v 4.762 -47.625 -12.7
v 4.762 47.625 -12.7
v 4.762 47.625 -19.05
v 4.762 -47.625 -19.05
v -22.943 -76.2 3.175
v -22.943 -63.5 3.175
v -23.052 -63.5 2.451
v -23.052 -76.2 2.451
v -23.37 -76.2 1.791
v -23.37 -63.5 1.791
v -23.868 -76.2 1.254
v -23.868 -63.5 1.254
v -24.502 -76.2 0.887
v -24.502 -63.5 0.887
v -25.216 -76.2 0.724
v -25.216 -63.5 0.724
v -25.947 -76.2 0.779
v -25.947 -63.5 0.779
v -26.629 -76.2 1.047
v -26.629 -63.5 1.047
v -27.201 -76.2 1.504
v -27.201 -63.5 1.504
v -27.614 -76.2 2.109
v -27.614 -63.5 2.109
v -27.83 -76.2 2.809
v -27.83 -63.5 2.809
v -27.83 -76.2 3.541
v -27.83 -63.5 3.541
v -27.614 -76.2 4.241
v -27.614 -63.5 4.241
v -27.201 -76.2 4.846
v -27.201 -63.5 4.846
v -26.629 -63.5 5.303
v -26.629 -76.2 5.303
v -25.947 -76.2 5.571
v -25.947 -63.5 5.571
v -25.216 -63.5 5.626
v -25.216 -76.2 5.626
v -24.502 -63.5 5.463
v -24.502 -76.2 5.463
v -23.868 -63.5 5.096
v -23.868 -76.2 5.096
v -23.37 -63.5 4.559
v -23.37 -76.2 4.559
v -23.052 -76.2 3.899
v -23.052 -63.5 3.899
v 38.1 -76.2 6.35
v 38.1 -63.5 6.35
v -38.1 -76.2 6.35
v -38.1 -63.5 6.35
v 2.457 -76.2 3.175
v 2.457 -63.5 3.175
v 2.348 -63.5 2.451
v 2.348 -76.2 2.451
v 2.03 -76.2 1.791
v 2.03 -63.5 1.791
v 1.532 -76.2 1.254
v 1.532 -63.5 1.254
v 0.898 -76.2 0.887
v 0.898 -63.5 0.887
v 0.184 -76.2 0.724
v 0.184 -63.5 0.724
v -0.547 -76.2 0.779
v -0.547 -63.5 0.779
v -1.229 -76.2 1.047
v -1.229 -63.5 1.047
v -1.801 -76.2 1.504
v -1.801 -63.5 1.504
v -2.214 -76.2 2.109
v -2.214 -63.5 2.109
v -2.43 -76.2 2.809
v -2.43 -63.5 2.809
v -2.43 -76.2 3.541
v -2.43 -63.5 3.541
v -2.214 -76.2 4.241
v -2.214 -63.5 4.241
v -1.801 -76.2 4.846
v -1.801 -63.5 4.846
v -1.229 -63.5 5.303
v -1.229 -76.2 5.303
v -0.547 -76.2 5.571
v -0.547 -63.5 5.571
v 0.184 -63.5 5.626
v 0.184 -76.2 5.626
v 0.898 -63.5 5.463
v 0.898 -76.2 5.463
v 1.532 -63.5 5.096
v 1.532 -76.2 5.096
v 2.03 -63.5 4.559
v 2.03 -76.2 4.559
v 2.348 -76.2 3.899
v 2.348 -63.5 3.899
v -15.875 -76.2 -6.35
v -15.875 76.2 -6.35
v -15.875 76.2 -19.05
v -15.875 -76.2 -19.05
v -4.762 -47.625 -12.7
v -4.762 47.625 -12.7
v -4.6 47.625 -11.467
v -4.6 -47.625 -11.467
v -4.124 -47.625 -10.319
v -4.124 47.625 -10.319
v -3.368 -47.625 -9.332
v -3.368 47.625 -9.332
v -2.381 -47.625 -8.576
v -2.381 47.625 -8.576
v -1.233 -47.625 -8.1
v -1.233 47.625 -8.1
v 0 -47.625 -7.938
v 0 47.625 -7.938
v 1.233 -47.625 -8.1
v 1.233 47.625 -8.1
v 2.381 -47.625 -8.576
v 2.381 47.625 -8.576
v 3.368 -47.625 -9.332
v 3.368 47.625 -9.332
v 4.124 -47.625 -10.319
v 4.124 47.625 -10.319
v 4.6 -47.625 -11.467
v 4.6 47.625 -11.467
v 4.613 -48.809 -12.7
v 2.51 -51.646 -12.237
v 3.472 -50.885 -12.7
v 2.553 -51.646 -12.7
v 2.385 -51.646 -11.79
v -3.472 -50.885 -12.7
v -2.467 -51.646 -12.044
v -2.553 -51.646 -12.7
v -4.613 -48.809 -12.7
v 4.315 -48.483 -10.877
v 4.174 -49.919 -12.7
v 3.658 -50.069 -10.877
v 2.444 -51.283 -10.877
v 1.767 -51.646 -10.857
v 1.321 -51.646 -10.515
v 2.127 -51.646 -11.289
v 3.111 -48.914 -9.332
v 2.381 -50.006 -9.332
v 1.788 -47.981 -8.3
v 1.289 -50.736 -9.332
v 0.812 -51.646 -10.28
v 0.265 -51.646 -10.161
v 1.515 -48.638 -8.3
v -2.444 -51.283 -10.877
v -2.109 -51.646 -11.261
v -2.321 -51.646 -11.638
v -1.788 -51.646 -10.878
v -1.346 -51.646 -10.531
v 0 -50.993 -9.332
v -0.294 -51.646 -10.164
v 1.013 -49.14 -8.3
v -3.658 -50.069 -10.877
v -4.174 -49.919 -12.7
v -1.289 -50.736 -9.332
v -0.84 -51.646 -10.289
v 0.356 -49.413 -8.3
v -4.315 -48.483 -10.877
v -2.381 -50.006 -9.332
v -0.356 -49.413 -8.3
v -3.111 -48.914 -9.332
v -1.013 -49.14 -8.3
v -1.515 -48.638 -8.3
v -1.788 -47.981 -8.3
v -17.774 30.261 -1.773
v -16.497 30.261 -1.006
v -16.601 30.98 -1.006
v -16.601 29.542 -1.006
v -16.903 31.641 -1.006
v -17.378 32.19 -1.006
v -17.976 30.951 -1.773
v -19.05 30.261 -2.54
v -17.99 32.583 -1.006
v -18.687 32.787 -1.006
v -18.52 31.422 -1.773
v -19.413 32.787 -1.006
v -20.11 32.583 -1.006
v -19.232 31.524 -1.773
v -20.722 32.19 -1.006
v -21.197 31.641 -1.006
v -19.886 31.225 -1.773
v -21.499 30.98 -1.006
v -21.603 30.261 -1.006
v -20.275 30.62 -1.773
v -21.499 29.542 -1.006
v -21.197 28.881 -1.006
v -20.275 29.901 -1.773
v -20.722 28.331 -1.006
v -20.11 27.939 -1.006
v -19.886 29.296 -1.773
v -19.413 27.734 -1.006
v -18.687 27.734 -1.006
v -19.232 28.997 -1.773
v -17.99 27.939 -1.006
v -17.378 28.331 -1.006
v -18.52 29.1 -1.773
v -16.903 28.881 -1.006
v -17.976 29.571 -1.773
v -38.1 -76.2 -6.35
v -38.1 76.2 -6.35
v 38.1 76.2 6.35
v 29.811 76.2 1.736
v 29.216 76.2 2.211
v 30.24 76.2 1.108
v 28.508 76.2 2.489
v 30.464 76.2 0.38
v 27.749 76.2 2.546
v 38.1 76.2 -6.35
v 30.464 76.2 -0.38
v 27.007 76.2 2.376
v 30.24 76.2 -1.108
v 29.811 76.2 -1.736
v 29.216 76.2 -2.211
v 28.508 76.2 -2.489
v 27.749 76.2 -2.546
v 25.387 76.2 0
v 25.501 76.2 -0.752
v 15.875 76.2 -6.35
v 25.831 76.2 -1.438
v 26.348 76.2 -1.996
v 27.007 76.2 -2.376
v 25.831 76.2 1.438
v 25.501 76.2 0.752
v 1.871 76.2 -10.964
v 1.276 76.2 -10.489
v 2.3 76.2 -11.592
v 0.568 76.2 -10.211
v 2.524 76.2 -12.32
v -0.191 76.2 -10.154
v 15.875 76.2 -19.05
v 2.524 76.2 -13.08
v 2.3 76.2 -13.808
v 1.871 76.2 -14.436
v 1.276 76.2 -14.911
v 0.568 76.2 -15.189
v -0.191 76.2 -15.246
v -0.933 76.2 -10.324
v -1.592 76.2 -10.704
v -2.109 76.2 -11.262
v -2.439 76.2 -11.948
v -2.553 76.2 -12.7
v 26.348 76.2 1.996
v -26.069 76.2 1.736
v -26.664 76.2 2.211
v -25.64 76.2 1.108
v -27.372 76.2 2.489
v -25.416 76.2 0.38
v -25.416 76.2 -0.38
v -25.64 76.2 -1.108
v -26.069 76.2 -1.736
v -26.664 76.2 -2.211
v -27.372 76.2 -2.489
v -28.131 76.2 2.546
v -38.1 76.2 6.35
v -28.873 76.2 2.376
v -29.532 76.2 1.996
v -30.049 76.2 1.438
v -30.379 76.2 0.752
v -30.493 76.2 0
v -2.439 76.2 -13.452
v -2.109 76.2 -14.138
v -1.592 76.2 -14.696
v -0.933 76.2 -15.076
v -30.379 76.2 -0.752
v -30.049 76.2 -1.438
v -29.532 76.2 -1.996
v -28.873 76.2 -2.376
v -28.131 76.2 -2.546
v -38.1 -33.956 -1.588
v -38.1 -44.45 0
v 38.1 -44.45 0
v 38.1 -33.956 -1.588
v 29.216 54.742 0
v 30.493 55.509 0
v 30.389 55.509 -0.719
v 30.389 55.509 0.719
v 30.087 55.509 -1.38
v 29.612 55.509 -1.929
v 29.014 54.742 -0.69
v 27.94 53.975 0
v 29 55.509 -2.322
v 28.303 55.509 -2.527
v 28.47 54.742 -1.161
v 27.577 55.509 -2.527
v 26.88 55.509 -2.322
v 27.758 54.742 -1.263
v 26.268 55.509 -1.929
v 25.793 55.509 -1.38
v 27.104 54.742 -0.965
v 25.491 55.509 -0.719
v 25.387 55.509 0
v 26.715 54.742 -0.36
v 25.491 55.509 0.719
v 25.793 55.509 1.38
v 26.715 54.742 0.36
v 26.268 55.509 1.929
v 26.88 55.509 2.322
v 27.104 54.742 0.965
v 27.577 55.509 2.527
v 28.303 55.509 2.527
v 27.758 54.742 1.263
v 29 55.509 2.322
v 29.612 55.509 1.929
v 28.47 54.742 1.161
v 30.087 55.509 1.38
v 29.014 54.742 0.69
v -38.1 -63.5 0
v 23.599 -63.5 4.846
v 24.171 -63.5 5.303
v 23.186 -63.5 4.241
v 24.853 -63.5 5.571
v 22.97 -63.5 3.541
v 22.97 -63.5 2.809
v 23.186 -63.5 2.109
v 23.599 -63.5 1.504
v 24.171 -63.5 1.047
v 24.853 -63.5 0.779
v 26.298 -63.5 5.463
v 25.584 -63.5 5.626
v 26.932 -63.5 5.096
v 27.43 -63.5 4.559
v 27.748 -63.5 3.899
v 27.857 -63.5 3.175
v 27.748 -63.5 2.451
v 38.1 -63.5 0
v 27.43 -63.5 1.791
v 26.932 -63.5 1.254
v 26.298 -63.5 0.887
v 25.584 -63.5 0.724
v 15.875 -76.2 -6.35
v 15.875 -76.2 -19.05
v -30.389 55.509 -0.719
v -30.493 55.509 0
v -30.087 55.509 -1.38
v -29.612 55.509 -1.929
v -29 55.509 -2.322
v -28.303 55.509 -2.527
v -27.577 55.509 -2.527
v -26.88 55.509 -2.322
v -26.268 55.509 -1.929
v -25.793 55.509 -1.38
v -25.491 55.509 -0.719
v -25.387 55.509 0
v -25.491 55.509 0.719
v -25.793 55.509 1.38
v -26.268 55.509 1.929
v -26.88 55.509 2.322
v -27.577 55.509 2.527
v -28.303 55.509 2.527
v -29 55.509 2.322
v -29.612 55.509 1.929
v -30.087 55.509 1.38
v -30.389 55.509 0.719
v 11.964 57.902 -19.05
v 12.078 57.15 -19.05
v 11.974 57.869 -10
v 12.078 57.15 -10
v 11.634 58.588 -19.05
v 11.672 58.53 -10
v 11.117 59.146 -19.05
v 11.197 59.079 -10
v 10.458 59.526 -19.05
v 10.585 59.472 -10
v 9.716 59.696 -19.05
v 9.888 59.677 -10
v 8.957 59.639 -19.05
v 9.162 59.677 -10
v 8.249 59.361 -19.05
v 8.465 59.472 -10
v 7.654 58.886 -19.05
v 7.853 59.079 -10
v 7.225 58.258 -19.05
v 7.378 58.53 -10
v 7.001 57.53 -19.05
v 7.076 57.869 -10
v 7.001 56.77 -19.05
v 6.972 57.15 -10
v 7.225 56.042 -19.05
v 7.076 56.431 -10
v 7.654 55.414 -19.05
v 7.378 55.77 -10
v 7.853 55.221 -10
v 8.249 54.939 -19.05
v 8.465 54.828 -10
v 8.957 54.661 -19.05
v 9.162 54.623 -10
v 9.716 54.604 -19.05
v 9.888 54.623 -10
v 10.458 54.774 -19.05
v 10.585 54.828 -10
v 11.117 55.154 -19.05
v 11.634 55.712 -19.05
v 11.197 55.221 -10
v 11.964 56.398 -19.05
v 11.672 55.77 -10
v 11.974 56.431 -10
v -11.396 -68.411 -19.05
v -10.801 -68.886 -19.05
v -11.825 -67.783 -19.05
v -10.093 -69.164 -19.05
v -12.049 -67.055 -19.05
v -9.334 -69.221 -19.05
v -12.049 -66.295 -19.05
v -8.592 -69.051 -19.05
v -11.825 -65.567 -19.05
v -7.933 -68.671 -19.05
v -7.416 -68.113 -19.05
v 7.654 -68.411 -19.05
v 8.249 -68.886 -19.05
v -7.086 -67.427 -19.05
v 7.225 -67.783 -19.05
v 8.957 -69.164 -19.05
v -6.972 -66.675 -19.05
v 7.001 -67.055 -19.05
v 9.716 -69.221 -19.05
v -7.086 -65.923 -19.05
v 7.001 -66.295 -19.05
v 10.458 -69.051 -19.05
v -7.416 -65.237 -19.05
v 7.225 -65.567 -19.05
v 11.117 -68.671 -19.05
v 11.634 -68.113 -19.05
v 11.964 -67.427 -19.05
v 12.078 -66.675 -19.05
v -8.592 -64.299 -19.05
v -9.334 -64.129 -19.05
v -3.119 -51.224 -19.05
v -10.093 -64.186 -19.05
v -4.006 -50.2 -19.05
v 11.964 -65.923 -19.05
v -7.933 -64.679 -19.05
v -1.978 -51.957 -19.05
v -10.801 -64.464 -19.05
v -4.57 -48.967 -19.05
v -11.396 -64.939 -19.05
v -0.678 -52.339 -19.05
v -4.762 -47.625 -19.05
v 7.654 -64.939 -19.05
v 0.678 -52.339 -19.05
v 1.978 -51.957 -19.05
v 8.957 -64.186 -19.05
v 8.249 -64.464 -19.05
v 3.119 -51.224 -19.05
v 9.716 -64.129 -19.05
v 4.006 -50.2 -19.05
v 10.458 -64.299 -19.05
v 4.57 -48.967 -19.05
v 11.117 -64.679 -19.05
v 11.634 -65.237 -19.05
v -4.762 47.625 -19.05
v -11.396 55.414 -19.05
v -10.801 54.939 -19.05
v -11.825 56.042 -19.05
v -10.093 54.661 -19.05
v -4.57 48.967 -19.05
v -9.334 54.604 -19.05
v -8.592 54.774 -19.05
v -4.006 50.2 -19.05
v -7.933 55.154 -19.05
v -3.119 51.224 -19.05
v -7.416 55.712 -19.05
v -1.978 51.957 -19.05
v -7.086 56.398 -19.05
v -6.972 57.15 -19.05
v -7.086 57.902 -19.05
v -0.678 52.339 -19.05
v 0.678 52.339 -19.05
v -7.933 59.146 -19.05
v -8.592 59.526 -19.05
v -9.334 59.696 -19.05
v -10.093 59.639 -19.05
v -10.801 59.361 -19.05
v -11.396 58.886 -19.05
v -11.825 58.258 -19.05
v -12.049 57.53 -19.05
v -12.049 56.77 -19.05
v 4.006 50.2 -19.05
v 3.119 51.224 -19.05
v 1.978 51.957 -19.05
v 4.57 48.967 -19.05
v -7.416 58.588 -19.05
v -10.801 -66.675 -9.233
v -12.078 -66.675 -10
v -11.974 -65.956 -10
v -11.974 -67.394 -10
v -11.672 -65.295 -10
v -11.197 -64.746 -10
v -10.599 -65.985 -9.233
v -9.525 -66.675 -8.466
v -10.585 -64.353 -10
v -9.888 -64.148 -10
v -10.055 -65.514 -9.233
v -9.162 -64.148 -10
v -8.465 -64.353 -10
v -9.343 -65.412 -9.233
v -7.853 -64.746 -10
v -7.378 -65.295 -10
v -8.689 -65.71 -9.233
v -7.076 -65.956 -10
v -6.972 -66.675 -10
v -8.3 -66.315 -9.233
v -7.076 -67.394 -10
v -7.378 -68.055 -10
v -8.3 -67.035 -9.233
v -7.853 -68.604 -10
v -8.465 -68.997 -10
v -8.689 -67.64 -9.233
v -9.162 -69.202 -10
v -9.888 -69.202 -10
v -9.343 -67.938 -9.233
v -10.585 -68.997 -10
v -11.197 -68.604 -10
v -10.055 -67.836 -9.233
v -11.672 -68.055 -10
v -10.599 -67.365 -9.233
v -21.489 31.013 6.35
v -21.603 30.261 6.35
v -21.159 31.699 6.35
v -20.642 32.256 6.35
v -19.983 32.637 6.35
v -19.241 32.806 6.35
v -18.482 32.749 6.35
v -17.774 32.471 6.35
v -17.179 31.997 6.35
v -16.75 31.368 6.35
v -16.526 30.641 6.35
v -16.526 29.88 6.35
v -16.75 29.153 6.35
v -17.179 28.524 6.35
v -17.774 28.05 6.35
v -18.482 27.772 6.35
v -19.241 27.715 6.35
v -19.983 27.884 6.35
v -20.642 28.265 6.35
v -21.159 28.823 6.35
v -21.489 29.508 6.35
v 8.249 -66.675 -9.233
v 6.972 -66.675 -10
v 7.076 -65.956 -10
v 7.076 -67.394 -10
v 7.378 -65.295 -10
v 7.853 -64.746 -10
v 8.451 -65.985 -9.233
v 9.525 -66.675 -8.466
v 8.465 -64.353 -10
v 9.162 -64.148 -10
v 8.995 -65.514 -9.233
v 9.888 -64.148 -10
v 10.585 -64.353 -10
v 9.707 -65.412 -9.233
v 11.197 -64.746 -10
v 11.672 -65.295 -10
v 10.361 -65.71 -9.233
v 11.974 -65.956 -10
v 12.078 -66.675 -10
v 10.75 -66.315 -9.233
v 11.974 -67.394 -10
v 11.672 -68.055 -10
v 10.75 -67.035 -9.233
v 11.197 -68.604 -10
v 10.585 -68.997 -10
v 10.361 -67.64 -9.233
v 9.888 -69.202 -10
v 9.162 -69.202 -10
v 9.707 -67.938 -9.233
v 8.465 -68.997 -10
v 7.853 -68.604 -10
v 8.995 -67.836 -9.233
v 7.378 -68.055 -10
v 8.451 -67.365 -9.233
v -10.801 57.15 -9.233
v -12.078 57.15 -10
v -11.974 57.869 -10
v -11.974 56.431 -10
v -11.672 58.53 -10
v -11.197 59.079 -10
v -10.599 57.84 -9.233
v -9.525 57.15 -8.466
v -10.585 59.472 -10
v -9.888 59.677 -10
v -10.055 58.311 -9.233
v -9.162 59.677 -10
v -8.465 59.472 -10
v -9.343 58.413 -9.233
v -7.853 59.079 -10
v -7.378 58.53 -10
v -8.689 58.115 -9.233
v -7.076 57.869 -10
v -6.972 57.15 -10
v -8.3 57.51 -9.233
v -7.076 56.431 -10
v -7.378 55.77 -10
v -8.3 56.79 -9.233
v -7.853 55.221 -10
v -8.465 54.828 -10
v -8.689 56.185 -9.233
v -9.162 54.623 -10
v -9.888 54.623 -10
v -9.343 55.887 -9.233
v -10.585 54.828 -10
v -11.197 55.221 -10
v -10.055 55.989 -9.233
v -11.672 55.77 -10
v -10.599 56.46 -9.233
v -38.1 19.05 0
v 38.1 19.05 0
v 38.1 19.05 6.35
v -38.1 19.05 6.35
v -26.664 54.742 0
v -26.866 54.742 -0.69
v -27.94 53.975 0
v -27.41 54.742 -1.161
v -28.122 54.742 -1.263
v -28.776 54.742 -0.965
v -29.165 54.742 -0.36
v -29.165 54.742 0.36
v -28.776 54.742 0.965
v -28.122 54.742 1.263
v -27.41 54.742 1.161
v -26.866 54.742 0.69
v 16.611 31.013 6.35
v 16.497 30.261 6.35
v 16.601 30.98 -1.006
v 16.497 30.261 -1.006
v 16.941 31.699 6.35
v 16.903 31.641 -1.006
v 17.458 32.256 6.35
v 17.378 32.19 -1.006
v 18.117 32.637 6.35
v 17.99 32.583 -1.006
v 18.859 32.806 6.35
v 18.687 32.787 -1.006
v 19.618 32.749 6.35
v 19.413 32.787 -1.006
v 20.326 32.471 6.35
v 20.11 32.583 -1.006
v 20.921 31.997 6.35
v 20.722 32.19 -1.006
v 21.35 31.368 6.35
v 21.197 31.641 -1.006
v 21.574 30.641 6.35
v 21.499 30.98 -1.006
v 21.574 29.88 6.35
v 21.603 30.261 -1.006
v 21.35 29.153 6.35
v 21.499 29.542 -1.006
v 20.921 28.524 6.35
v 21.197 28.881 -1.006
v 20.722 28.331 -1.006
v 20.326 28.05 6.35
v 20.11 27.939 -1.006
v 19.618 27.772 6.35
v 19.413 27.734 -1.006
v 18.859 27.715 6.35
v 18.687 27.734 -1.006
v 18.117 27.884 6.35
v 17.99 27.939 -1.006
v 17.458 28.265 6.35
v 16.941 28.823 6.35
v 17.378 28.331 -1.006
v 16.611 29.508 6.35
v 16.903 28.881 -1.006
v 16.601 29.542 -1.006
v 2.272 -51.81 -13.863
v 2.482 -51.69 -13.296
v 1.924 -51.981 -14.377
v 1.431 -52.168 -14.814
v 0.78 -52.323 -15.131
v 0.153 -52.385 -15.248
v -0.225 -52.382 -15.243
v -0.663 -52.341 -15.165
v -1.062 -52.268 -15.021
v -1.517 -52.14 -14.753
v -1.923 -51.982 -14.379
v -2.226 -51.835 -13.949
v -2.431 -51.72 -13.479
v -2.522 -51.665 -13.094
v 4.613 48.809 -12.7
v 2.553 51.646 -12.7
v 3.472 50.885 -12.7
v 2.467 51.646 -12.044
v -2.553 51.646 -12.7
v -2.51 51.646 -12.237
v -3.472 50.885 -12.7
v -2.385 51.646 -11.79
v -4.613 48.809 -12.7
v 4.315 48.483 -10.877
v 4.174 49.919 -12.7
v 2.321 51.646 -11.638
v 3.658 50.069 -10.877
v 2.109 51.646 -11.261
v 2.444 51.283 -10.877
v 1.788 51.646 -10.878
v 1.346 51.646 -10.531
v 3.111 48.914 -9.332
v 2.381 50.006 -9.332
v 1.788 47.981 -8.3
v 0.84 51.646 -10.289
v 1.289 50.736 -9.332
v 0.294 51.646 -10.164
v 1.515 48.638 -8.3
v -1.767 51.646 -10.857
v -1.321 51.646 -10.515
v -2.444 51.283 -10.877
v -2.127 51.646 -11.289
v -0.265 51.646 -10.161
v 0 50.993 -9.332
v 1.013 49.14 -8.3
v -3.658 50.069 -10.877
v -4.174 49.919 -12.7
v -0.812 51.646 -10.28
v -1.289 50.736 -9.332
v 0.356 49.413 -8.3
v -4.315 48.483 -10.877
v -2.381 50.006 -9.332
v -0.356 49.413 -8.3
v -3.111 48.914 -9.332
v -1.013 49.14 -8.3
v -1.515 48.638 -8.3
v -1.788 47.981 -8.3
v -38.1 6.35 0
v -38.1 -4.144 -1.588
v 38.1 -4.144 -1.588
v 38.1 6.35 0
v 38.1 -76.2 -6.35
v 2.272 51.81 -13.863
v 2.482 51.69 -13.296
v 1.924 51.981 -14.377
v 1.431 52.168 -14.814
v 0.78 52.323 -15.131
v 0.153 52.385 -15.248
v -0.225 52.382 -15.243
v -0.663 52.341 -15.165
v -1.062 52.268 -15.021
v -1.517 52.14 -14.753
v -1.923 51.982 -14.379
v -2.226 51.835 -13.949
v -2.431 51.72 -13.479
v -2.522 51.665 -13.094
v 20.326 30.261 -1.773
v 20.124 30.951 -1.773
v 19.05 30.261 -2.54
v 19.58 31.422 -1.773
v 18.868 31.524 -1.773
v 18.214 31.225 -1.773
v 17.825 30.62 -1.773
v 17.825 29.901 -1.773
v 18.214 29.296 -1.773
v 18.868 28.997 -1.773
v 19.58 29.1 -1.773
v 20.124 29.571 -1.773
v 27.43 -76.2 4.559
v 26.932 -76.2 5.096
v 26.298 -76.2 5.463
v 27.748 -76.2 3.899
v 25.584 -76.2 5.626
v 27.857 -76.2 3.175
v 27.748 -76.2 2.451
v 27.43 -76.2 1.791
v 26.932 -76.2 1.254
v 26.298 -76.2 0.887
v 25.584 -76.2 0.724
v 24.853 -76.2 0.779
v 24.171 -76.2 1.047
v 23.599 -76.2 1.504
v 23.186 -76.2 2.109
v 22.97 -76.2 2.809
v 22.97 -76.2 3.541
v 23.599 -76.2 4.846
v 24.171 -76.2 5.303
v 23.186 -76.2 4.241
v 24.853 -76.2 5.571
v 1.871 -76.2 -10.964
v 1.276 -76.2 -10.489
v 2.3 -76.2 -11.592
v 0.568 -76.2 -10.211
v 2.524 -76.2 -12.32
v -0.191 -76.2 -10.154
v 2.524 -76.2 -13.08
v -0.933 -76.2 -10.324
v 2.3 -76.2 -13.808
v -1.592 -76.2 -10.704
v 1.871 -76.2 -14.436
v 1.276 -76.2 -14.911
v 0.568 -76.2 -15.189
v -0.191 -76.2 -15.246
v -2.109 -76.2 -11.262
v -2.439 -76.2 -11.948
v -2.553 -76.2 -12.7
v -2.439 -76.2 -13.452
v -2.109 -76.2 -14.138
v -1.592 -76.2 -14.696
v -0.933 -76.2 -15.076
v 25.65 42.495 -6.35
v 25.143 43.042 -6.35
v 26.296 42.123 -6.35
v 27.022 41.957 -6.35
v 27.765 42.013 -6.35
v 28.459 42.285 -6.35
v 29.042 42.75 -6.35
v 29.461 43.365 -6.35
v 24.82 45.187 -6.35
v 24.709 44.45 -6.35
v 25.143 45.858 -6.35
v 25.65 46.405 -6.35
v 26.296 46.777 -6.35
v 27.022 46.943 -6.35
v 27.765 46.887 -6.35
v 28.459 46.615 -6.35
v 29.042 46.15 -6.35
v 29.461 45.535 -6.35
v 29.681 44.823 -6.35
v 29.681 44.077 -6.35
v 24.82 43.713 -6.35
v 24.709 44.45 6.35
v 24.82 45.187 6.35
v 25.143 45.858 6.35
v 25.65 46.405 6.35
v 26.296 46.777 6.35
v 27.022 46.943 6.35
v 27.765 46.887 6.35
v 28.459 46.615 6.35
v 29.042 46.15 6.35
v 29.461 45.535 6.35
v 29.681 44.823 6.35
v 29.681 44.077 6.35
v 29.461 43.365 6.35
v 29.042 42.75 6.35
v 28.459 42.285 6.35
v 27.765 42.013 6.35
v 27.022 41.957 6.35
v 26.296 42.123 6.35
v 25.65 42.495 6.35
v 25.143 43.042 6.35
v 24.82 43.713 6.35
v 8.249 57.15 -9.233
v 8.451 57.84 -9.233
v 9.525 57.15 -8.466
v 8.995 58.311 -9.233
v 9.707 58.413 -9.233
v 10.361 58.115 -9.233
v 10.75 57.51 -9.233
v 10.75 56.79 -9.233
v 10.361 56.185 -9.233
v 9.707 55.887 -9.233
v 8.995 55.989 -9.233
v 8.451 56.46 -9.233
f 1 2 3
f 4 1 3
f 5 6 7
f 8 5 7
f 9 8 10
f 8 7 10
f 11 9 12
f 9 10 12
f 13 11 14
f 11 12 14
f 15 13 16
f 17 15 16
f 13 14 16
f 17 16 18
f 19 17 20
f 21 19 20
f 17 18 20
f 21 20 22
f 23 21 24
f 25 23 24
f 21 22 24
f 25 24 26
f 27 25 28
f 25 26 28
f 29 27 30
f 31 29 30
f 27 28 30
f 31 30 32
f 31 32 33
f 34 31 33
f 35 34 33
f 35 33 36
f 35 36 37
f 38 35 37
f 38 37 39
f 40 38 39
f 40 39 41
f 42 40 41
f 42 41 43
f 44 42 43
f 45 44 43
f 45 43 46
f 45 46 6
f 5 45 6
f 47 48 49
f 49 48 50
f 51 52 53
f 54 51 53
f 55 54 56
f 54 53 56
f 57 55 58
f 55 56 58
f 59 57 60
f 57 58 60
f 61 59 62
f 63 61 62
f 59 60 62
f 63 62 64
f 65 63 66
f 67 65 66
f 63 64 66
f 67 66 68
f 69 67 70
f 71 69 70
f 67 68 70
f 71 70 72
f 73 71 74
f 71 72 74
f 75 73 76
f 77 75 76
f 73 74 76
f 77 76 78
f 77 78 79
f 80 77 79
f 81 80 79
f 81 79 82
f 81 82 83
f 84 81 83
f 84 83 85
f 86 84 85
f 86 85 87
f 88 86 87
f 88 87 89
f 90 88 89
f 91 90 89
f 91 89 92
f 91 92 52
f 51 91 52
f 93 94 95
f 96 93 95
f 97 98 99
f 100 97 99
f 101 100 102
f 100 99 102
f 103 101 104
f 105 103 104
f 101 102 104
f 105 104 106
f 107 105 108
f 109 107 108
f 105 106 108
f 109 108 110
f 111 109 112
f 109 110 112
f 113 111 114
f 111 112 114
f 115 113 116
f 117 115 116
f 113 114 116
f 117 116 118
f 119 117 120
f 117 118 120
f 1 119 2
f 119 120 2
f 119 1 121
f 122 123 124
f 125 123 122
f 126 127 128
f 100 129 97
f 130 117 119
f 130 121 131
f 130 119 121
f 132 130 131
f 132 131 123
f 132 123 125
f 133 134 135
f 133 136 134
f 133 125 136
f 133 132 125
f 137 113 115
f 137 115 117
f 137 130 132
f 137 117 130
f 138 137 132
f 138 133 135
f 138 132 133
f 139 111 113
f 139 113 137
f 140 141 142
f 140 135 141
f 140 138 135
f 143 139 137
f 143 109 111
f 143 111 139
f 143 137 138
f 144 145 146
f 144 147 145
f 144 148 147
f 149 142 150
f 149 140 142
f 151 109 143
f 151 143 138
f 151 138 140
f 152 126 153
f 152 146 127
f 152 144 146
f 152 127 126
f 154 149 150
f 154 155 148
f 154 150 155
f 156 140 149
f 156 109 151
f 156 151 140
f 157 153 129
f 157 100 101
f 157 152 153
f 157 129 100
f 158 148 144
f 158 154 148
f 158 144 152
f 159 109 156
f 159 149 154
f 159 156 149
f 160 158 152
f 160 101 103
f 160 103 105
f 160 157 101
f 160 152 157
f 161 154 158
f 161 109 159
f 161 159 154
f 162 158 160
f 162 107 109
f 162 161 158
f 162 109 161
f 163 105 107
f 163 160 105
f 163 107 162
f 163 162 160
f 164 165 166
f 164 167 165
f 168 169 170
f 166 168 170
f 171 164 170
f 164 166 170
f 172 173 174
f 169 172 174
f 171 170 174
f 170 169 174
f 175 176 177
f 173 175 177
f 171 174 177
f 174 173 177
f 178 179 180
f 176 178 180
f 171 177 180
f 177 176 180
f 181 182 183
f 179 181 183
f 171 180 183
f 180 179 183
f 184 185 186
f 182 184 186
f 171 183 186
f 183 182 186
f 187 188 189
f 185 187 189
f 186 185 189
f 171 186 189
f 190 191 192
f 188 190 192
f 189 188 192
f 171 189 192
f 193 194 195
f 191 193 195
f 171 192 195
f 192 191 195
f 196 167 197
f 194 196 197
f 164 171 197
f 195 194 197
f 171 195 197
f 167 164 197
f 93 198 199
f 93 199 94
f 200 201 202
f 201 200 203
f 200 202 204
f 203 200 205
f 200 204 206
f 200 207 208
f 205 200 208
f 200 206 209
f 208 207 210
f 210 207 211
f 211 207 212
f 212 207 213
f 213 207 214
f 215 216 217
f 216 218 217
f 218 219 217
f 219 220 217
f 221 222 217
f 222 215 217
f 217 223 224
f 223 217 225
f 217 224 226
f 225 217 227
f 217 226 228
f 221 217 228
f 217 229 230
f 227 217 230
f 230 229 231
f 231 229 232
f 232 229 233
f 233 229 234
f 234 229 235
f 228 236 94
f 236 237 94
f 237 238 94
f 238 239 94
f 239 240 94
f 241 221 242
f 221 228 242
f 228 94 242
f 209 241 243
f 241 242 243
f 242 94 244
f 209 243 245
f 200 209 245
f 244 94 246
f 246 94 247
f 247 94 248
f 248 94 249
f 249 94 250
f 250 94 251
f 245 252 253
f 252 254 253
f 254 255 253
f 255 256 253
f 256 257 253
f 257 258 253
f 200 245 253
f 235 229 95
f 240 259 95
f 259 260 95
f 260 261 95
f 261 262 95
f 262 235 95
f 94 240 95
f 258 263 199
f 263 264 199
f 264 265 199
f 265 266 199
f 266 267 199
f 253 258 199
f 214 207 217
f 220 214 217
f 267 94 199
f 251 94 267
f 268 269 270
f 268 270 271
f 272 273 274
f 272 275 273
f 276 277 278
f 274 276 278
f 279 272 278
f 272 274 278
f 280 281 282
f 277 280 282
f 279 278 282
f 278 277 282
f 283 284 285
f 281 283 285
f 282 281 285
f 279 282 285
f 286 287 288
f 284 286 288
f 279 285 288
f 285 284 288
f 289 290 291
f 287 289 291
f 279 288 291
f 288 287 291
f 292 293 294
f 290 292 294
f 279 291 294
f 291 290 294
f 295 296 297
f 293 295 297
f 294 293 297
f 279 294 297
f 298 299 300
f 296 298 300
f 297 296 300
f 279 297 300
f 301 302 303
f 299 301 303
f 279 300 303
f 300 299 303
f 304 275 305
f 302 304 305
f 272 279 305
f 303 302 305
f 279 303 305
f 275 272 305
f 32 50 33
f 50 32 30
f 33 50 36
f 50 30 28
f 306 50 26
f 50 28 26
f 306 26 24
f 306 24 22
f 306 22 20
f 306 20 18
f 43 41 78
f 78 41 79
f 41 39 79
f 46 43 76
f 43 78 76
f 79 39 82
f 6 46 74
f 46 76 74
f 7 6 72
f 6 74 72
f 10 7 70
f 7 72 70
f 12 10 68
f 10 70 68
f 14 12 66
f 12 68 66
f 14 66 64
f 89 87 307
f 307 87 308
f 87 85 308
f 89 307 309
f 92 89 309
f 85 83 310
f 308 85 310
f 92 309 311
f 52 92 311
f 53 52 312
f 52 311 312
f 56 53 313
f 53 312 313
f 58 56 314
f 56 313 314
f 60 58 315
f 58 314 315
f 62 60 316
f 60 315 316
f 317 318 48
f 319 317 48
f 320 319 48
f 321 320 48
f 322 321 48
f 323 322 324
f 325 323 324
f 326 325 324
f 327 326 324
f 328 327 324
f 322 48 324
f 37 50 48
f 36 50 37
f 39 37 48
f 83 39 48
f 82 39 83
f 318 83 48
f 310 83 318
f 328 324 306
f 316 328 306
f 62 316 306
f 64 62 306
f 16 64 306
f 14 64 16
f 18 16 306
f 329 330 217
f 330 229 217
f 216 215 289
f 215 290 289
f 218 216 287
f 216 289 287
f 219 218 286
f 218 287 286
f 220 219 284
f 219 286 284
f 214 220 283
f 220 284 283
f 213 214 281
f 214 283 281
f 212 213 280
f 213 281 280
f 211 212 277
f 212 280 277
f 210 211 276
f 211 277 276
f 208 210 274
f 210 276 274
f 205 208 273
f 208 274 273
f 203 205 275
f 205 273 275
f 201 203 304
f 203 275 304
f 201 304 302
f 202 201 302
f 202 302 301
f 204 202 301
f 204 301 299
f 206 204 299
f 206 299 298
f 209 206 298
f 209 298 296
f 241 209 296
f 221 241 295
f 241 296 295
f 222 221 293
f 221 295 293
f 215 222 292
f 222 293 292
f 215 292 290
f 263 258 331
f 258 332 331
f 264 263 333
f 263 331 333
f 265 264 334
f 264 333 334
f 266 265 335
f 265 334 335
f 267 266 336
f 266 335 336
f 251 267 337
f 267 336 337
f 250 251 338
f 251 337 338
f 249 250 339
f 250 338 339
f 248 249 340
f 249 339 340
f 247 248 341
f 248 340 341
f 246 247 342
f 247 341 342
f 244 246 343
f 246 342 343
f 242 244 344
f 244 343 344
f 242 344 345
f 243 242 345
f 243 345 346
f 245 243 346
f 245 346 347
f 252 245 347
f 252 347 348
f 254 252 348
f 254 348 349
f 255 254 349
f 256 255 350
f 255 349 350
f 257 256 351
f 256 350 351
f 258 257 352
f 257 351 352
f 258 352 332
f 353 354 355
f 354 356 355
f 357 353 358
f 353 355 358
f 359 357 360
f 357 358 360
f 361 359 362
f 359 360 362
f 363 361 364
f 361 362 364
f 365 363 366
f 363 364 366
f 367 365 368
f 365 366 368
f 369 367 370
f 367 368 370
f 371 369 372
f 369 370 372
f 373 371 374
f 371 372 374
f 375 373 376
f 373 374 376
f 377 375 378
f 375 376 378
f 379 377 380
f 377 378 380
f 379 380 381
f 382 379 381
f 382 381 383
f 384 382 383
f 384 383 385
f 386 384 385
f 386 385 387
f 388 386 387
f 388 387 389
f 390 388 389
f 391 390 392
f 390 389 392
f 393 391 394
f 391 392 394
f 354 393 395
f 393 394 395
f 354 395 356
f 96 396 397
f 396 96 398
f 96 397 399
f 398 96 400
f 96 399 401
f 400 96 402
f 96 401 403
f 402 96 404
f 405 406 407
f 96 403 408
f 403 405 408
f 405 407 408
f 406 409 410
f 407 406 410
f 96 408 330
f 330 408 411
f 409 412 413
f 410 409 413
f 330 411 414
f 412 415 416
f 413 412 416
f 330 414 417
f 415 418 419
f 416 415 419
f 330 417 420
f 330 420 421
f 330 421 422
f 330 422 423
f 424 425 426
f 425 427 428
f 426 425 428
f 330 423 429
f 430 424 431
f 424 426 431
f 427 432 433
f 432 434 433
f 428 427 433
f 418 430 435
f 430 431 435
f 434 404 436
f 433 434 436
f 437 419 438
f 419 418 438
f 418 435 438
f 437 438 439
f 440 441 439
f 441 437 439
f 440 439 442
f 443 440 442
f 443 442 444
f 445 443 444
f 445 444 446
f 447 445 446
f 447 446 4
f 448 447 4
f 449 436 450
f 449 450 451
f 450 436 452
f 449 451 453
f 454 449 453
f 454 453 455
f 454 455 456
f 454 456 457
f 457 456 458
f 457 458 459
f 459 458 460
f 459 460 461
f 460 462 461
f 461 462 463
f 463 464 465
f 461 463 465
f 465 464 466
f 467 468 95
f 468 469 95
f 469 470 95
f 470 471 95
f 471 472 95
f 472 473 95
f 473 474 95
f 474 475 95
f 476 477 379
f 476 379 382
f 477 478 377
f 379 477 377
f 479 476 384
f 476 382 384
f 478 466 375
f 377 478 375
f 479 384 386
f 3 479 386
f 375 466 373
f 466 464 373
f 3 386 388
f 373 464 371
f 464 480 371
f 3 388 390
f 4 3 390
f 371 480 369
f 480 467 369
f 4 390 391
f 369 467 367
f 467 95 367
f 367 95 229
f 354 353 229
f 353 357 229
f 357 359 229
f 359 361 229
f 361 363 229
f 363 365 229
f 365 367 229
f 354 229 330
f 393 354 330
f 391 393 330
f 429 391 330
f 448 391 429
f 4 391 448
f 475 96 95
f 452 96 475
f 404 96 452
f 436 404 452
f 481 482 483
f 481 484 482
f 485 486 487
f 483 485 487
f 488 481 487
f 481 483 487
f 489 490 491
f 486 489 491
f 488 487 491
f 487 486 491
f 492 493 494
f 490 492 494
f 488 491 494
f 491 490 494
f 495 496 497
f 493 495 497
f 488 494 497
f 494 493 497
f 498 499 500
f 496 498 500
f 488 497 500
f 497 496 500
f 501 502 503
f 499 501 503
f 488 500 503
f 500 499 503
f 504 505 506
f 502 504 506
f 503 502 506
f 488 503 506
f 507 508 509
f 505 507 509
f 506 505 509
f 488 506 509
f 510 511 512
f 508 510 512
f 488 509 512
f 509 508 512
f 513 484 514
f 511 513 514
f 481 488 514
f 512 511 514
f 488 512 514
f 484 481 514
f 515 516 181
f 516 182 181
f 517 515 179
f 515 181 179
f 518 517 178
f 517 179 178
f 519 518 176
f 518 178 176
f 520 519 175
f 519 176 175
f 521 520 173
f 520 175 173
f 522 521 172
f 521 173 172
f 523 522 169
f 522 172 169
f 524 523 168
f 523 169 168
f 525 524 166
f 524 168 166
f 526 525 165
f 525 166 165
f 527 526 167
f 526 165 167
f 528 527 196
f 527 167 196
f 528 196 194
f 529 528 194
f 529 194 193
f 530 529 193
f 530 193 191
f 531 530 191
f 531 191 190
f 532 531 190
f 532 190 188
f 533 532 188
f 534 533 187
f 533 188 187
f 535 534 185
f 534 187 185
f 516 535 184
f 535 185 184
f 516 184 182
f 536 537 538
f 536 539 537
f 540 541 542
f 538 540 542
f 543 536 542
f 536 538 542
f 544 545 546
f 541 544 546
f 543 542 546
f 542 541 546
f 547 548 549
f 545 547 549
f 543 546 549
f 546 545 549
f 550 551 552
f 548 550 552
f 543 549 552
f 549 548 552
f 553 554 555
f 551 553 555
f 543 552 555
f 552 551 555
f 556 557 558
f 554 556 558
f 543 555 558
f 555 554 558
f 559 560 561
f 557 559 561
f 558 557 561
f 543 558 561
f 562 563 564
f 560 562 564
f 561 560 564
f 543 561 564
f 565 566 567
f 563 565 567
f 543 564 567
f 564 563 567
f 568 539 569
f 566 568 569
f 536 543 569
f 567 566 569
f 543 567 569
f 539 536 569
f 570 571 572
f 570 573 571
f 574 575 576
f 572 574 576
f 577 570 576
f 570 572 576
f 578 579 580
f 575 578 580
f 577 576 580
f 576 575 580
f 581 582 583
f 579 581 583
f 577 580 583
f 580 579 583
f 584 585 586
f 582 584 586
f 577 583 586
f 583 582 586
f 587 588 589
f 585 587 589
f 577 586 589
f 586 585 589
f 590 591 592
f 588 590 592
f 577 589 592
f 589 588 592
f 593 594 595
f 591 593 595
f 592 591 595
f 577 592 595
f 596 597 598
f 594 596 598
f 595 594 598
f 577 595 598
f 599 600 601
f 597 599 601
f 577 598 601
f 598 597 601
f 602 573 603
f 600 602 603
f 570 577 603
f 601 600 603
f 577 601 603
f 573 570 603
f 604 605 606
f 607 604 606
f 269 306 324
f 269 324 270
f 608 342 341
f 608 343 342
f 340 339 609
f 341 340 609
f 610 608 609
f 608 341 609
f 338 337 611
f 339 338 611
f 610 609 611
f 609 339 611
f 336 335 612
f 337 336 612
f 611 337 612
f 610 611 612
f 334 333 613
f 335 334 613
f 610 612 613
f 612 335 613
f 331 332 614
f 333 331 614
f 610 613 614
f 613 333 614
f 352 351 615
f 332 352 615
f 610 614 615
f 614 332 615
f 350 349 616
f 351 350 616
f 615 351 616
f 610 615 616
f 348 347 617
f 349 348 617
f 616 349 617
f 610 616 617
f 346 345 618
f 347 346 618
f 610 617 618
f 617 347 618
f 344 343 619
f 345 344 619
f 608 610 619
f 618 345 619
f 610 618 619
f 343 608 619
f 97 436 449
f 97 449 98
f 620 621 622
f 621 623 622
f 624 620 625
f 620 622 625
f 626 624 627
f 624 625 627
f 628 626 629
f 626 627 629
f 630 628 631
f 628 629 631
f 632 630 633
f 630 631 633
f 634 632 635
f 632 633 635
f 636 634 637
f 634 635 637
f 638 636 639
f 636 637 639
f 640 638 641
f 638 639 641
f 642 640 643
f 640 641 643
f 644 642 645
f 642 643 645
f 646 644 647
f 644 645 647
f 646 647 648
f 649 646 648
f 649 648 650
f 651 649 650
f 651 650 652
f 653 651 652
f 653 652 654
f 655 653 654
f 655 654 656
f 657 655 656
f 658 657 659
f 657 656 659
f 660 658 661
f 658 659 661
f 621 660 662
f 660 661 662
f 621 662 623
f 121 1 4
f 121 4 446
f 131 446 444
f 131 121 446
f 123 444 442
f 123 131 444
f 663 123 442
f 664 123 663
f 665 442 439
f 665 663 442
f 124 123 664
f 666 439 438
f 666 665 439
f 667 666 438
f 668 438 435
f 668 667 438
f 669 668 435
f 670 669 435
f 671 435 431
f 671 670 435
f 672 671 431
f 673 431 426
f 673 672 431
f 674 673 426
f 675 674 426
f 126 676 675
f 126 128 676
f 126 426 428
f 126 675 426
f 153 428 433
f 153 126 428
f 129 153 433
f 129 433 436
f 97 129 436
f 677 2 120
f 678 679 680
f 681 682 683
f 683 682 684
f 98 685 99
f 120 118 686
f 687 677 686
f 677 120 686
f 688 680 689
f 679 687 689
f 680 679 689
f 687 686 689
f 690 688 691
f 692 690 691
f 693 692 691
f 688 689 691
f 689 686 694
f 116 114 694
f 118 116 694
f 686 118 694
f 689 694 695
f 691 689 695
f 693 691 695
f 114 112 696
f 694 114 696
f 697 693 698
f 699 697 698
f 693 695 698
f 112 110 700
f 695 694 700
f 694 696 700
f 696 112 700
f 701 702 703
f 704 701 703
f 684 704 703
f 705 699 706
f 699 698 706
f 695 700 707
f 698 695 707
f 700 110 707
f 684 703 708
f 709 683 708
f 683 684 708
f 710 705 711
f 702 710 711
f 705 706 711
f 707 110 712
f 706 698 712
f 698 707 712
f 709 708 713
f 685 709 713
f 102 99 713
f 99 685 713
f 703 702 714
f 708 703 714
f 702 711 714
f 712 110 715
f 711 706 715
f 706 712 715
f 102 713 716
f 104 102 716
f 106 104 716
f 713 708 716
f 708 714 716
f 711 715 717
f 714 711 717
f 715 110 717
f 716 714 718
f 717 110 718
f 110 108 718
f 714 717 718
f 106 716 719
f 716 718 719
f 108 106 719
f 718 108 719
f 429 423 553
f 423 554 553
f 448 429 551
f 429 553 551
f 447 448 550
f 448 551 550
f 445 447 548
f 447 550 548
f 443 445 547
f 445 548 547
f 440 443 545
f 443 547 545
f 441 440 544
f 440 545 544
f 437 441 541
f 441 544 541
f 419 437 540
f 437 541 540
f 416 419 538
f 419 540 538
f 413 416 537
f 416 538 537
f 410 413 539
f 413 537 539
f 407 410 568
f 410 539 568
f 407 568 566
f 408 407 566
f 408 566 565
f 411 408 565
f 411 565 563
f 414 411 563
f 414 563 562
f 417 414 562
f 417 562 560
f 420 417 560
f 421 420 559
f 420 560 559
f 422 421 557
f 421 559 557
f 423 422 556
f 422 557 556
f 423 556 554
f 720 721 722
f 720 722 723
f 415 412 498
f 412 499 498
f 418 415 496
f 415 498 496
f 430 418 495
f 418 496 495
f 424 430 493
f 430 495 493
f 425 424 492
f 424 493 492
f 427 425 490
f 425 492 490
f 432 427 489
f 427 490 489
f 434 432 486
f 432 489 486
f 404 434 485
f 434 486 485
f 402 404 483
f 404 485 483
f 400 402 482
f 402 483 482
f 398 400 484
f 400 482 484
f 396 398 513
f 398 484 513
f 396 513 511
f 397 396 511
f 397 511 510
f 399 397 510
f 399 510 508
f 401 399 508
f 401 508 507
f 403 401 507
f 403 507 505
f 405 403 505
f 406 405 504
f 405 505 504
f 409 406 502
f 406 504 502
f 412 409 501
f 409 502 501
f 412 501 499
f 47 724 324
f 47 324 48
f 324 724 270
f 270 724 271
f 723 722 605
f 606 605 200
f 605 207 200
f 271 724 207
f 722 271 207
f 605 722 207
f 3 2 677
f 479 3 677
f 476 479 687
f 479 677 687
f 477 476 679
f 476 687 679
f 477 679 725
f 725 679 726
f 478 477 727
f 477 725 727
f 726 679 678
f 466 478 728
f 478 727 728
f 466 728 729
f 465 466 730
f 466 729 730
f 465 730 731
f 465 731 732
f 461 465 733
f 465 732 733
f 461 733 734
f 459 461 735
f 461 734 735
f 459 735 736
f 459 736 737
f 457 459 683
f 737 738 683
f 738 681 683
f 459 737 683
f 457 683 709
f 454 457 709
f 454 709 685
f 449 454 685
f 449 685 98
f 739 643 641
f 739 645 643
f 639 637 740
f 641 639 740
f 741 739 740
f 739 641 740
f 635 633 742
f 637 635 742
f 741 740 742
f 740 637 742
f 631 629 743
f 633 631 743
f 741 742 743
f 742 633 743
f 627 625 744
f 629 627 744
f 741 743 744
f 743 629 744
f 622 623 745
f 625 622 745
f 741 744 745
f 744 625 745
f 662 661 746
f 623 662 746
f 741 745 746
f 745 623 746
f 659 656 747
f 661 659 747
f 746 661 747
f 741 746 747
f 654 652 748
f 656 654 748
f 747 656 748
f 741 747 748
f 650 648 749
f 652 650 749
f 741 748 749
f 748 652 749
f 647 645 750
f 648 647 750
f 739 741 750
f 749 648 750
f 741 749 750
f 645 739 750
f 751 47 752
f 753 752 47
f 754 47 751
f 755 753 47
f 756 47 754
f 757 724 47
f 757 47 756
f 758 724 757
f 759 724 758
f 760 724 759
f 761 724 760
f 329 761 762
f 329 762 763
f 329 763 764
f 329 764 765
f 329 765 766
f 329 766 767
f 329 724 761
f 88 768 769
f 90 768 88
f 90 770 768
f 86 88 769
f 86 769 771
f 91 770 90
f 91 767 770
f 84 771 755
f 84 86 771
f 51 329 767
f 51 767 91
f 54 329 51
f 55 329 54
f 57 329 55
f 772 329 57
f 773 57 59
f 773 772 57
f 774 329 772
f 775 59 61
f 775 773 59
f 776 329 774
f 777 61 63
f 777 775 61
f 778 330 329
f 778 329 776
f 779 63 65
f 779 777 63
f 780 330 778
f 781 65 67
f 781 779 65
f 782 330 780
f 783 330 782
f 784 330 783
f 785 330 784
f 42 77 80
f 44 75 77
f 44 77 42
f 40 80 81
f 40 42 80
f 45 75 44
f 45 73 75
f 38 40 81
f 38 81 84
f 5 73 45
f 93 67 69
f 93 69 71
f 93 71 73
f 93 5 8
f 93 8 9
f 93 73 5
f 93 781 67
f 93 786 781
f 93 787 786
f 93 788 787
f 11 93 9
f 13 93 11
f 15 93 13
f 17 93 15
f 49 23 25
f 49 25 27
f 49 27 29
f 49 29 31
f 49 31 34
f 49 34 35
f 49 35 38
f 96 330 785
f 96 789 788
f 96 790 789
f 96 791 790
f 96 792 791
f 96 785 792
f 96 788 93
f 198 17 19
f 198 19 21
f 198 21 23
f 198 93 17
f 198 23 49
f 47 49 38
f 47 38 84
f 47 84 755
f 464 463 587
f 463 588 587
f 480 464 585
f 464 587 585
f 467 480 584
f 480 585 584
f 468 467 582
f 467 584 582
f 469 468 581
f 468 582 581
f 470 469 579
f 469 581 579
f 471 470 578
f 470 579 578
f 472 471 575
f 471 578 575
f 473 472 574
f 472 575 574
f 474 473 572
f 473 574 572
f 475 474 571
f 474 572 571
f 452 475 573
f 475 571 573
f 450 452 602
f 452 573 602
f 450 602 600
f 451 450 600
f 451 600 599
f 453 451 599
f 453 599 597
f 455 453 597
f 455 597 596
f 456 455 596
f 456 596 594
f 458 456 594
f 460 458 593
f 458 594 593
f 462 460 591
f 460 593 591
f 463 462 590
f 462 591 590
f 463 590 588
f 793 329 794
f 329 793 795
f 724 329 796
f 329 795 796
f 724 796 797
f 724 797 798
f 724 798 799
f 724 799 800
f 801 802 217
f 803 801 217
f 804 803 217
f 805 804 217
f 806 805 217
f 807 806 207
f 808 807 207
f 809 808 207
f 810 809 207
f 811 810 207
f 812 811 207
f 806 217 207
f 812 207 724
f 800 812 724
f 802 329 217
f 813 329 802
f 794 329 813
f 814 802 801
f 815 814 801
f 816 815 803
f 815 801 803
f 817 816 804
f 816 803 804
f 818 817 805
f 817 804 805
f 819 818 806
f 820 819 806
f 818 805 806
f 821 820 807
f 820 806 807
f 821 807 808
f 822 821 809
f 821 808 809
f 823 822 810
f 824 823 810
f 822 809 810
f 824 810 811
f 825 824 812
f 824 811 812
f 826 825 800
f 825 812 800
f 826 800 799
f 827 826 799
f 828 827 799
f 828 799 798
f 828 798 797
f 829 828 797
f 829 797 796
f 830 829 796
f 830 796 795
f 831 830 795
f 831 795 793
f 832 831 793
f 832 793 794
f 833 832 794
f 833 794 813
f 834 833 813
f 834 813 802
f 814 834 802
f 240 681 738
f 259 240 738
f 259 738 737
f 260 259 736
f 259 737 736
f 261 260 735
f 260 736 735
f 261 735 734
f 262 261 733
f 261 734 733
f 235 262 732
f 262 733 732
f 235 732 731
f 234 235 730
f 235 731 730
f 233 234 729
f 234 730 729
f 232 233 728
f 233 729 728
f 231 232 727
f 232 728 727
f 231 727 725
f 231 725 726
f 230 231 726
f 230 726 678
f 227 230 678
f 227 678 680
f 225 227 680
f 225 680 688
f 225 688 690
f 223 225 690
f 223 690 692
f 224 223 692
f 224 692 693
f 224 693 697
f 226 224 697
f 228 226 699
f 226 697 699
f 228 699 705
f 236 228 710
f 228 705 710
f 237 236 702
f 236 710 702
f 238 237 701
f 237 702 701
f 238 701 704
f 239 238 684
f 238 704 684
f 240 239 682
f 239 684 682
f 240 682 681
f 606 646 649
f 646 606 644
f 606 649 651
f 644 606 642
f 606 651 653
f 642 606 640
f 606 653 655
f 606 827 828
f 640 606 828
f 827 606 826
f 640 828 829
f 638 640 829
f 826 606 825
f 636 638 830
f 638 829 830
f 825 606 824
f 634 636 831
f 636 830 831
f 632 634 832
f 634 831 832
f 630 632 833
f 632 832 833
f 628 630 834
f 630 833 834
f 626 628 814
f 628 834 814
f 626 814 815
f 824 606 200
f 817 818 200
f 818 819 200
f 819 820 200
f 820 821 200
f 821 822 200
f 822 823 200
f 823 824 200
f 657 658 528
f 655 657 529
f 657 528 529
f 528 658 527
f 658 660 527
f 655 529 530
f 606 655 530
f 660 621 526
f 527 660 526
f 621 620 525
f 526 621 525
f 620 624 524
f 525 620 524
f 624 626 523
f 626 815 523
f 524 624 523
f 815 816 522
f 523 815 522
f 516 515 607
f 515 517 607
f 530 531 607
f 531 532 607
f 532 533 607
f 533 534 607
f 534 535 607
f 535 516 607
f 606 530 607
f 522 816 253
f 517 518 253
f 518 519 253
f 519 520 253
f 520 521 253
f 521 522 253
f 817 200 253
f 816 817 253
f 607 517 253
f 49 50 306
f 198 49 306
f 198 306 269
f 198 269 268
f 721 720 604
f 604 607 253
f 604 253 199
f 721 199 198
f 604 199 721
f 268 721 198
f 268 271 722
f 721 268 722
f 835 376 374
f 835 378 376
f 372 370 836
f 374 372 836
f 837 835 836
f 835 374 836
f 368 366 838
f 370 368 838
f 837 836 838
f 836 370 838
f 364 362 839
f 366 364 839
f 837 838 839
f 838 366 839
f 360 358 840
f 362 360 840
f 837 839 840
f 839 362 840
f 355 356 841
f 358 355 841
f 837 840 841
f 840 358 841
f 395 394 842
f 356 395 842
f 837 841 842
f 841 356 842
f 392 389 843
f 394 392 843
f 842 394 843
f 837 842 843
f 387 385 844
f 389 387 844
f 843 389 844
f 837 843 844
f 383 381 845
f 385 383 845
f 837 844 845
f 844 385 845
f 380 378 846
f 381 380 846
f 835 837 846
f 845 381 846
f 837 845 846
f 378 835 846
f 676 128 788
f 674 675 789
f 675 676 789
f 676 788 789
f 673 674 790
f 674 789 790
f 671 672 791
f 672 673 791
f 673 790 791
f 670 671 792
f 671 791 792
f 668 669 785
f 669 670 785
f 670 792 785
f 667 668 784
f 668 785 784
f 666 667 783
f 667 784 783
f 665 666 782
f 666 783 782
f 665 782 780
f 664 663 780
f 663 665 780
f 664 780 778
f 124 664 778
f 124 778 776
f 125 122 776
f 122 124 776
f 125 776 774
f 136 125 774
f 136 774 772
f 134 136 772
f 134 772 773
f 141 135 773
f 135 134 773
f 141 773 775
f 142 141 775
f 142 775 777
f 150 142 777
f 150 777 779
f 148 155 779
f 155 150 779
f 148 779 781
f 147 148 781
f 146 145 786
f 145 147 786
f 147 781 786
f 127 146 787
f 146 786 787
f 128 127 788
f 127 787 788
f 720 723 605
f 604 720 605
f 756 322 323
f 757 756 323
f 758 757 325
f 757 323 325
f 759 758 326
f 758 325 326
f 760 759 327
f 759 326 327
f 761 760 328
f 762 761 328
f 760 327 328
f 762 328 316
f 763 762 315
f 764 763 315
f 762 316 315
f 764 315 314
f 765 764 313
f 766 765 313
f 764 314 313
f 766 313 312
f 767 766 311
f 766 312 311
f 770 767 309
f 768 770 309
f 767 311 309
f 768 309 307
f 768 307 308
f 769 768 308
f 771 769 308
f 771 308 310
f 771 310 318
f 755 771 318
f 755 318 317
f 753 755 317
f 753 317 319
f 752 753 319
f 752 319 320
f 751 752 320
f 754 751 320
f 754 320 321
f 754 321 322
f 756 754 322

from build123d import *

# Parameters (mm, degrees)
BOSS_EXTRUDE1_DEPTH              = 76.2
CUT_EXTRUDE3_DEPTH               = 47.625
CUT_EXTRUDE4_DEPTH               = 110.433918417
F_10_0_1935_DIAMETER_HOLE1_D     = 4.9149
F_10_0_1935_DIAMETER_HOLE1_DEPTH = 19.05
F_10_0_1935_DIAMETER_HOLE1_TIP   = 1.476584928
F_1_4_20_TAPPED_HOLE1_D          = 5.1054
SKETCH19_R                       = 2.499999953
CUT_EXTRUDE5_DEPTH               = 87.135590889
F_1_4_20_TAPPED_HOLE2_D          = 5.1054
F_1_4_20_TAPPED_HOLE2_DEPTH      = 20.691183098
F_1_4_20_TAPPED_HOLE2_TIP        = 1.533816902
F_1_4_20_TAPPED_HOLE3_D          = 5.1054
F_1_4_20_TAPPED_HOLE3_DEPTH      = 9.05002
F_1_4_20_TAPPED_HOLE3_TIP        = 1.533816902
F_1_4_20_TAPPED_HOLE4_D          = 5.1054
F_1_4_20_TAPPED_HOLE4_DEPTH      = 7.356183098
F_1_4_20_TAPPED_HOLE4_TIP        = 1.533816902


with BuildPart() as part:
    # Sketch1 → Boss-Extrude1 (new, symmetric)
    with BuildSketch(Plane(origin=(0, 0, 0), x_dir=(1, 0, 0), z_dir=(0, 1, 0))):
        Polygon((-15.875, 6.35), (-15.875, 19.05), (15.875, 19.05), (15.875, 6.35), (38.1, 6.35), (38.1, -6.35), (-38.1, -6.35), (-38.1, 6.35), align=None)
    extrude(amount=BOSS_EXTRUDE1_DEPTH, both=True)

    # Sketch5 → Cut-Extrude3 (cut, symmetric)
    with BuildSketch(Plane(origin=(0, 0, 0), x_dir=(1, 0, 0), z_dir=(0, 1, 0))):
        with BuildLine():
            Line((-4.7625, 19.05), (-4.7625, 12.7))
            ThreePointArc((-4.7625, 12.7), (0, 7.9375), (4.7625, 12.7))
            Line((4.7625, 12.7), (4.7625, 19.05))
            Line((4.7625, 19.05), (-4.7625, 19.05))
        make_face()
    extrude(amount=CUT_EXTRUDE3_DEPTH, both=True, mode=Mode.SUBTRACT)

    # Sketch9 → Cut-Revolve1 (revolve, cut)
    with BuildSketch(Plane(origin=(0, 0, 0), x_dir=(0, 0, -1), z_dir=(1, 0, 0))):
        with BuildLine():
            Line((19.05, -52.3875), (12.7, -52.3875))
            ThreePointArc((12.7, -52.3875), (9.332403955, -50.992596045), (7.9375, -47.625))
            Line((7.9375, -47.625), (19.05, -47.625))
            Line((19.05, -47.625), (19.05, -52.3875))
        make_face()
    cut_revolve1 = revolve(axis=Axis((0, -47.625, -7.9375), (0, 0, -1)), mode=Mode.SUBTRACT)

    # Mirror1: Cut-Revolve1 across plane
    add(cut_revolve1.mirror(Plane.ZX), mode=Mode.SUBTRACT)

    # Sketch12 → Cut-Extrude4 (cut, through all)
    with BuildSketch(Plane(origin=(38.1, 0, 0), x_dir=(0, 0, -1), z_dir=(1, 0, 0))):
        Polygon((-6.35, -63.5), (0, -63.5), (0, -44.45), (1.5875, -33.956087115), (1.5875, -4.143912885), (0, 6.35), (0, 19.05), (-6.35, 19.05), align=None)
    extrude(amount=-CUT_EXTRUDE4_DEPTH, mode=Mode.SUBTRACT)

    # #10 (0.1935) Diameter Hole1
    with Locations(Plane(origin=(0, -76.2, 0), x_dir=(-1, 0, 0), z_dir=(0, -1, 0))):
        with Locations((25.4, -3.175), (-25.4, -3.175), (0, -3.175)):
            Hole(F_10_0_1935_DIAMETER_HOLE1_D / 2, depth=F_10_0_1935_DIAMETER_HOLE1_DEPTH)
            with Locations((0, 0, -(F_10_0_1935_DIAMETER_HOLE1_DEPTH + F_10_0_1935_DIAMETER_HOLE1_TIP / 2))):  # 118° drill point
                Cone(0, F_10_0_1935_DIAMETER_HOLE1_D / 2, F_10_0_1935_DIAMETER_HOLE1_TIP, mode=Mode.SUBTRACT)

    # 1/4-20 Tapped Hole1 (through all)
    with Locations(Plane(origin=(0, 76.2, 0), x_dir=(1, 0, 0), z_dir=(0, 1, 0))):
        with Locations((0, 12.7)):
            Hole(F_1_4_20_TAPPED_HOLE1_D / 2)

    # Sketch19 → Cut-Extrude5 (cut, through all)
    with BuildSketch(Plane(origin=(0, 0, -6.35), x_dir=(-1, 0, 0), z_dir=(0, 0, -1))):
        with Locations((-27.209019229, 44.45)):
            Circle(SKETCH19_R)
    extrude(amount=-CUT_EXTRUDE5_DEPTH, mode=Mode.SUBTRACT)

    # 1/4-20 Tapped Hole2
    with Locations(Plane(origin=(0, 76.2, 0), x_dir=(1, 0, 0), z_dir=(0, 1, 0))):
        with Locations((27.94, 0), (-27.94, 0)):
            Hole(F_1_4_20_TAPPED_HOLE2_D / 2, depth=F_1_4_20_TAPPED_HOLE2_DEPTH)
            with Locations((0, 0, -(F_1_4_20_TAPPED_HOLE2_DEPTH + F_1_4_20_TAPPED_HOLE2_TIP / 2))):  # 118° drill point
                Cone(0, F_1_4_20_TAPPED_HOLE2_D / 2, F_1_4_20_TAPPED_HOLE2_TIP, mode=Mode.SUBTRACT)

    # 1/4-20 Tapped Hole3
    with Locations(Plane(origin=(0, 0, -19.05), x_dir=(-1, 0, 0), z_dir=(0, 0, -1))):
        with Locations((-9.525, -66.675), (9.525, 57.15), (-9.525, 57.15), (9.525, -66.675)):
            Hole(F_1_4_20_TAPPED_HOLE3_D / 2, depth=F_1_4_20_TAPPED_HOLE3_DEPTH)
            with Locations((0, 0, -(F_1_4_20_TAPPED_HOLE3_DEPTH + F_1_4_20_TAPPED_HOLE3_TIP / 2))):  # 118° drill point
                Cone(0, F_1_4_20_TAPPED_HOLE3_D / 2, F_1_4_20_TAPPED_HOLE3_TIP, mode=Mode.SUBTRACT)

    # 1/4-20 Tapped Hole4
    with Locations(Plane.XY.offset(6.35)):
        with Locations((19.05, 30.260695081), (-19.05, 30.260695081)):
            Hole(F_1_4_20_TAPPED_HOLE4_D / 2, depth=F_1_4_20_TAPPED_HOLE4_DEPTH)
            with Locations((0, 0, -(F_1_4_20_TAPPED_HOLE4_DEPTH + F_1_4_20_TAPPED_HOLE4_TIP / 2))):  # 118° drill point
                Cone(0, F_1_4_20_TAPPED_HOLE4_D / 2, F_1_4_20_TAPPED_HOLE4_TIP, mode=Mode.SUBTRACT)


solid = part.part
